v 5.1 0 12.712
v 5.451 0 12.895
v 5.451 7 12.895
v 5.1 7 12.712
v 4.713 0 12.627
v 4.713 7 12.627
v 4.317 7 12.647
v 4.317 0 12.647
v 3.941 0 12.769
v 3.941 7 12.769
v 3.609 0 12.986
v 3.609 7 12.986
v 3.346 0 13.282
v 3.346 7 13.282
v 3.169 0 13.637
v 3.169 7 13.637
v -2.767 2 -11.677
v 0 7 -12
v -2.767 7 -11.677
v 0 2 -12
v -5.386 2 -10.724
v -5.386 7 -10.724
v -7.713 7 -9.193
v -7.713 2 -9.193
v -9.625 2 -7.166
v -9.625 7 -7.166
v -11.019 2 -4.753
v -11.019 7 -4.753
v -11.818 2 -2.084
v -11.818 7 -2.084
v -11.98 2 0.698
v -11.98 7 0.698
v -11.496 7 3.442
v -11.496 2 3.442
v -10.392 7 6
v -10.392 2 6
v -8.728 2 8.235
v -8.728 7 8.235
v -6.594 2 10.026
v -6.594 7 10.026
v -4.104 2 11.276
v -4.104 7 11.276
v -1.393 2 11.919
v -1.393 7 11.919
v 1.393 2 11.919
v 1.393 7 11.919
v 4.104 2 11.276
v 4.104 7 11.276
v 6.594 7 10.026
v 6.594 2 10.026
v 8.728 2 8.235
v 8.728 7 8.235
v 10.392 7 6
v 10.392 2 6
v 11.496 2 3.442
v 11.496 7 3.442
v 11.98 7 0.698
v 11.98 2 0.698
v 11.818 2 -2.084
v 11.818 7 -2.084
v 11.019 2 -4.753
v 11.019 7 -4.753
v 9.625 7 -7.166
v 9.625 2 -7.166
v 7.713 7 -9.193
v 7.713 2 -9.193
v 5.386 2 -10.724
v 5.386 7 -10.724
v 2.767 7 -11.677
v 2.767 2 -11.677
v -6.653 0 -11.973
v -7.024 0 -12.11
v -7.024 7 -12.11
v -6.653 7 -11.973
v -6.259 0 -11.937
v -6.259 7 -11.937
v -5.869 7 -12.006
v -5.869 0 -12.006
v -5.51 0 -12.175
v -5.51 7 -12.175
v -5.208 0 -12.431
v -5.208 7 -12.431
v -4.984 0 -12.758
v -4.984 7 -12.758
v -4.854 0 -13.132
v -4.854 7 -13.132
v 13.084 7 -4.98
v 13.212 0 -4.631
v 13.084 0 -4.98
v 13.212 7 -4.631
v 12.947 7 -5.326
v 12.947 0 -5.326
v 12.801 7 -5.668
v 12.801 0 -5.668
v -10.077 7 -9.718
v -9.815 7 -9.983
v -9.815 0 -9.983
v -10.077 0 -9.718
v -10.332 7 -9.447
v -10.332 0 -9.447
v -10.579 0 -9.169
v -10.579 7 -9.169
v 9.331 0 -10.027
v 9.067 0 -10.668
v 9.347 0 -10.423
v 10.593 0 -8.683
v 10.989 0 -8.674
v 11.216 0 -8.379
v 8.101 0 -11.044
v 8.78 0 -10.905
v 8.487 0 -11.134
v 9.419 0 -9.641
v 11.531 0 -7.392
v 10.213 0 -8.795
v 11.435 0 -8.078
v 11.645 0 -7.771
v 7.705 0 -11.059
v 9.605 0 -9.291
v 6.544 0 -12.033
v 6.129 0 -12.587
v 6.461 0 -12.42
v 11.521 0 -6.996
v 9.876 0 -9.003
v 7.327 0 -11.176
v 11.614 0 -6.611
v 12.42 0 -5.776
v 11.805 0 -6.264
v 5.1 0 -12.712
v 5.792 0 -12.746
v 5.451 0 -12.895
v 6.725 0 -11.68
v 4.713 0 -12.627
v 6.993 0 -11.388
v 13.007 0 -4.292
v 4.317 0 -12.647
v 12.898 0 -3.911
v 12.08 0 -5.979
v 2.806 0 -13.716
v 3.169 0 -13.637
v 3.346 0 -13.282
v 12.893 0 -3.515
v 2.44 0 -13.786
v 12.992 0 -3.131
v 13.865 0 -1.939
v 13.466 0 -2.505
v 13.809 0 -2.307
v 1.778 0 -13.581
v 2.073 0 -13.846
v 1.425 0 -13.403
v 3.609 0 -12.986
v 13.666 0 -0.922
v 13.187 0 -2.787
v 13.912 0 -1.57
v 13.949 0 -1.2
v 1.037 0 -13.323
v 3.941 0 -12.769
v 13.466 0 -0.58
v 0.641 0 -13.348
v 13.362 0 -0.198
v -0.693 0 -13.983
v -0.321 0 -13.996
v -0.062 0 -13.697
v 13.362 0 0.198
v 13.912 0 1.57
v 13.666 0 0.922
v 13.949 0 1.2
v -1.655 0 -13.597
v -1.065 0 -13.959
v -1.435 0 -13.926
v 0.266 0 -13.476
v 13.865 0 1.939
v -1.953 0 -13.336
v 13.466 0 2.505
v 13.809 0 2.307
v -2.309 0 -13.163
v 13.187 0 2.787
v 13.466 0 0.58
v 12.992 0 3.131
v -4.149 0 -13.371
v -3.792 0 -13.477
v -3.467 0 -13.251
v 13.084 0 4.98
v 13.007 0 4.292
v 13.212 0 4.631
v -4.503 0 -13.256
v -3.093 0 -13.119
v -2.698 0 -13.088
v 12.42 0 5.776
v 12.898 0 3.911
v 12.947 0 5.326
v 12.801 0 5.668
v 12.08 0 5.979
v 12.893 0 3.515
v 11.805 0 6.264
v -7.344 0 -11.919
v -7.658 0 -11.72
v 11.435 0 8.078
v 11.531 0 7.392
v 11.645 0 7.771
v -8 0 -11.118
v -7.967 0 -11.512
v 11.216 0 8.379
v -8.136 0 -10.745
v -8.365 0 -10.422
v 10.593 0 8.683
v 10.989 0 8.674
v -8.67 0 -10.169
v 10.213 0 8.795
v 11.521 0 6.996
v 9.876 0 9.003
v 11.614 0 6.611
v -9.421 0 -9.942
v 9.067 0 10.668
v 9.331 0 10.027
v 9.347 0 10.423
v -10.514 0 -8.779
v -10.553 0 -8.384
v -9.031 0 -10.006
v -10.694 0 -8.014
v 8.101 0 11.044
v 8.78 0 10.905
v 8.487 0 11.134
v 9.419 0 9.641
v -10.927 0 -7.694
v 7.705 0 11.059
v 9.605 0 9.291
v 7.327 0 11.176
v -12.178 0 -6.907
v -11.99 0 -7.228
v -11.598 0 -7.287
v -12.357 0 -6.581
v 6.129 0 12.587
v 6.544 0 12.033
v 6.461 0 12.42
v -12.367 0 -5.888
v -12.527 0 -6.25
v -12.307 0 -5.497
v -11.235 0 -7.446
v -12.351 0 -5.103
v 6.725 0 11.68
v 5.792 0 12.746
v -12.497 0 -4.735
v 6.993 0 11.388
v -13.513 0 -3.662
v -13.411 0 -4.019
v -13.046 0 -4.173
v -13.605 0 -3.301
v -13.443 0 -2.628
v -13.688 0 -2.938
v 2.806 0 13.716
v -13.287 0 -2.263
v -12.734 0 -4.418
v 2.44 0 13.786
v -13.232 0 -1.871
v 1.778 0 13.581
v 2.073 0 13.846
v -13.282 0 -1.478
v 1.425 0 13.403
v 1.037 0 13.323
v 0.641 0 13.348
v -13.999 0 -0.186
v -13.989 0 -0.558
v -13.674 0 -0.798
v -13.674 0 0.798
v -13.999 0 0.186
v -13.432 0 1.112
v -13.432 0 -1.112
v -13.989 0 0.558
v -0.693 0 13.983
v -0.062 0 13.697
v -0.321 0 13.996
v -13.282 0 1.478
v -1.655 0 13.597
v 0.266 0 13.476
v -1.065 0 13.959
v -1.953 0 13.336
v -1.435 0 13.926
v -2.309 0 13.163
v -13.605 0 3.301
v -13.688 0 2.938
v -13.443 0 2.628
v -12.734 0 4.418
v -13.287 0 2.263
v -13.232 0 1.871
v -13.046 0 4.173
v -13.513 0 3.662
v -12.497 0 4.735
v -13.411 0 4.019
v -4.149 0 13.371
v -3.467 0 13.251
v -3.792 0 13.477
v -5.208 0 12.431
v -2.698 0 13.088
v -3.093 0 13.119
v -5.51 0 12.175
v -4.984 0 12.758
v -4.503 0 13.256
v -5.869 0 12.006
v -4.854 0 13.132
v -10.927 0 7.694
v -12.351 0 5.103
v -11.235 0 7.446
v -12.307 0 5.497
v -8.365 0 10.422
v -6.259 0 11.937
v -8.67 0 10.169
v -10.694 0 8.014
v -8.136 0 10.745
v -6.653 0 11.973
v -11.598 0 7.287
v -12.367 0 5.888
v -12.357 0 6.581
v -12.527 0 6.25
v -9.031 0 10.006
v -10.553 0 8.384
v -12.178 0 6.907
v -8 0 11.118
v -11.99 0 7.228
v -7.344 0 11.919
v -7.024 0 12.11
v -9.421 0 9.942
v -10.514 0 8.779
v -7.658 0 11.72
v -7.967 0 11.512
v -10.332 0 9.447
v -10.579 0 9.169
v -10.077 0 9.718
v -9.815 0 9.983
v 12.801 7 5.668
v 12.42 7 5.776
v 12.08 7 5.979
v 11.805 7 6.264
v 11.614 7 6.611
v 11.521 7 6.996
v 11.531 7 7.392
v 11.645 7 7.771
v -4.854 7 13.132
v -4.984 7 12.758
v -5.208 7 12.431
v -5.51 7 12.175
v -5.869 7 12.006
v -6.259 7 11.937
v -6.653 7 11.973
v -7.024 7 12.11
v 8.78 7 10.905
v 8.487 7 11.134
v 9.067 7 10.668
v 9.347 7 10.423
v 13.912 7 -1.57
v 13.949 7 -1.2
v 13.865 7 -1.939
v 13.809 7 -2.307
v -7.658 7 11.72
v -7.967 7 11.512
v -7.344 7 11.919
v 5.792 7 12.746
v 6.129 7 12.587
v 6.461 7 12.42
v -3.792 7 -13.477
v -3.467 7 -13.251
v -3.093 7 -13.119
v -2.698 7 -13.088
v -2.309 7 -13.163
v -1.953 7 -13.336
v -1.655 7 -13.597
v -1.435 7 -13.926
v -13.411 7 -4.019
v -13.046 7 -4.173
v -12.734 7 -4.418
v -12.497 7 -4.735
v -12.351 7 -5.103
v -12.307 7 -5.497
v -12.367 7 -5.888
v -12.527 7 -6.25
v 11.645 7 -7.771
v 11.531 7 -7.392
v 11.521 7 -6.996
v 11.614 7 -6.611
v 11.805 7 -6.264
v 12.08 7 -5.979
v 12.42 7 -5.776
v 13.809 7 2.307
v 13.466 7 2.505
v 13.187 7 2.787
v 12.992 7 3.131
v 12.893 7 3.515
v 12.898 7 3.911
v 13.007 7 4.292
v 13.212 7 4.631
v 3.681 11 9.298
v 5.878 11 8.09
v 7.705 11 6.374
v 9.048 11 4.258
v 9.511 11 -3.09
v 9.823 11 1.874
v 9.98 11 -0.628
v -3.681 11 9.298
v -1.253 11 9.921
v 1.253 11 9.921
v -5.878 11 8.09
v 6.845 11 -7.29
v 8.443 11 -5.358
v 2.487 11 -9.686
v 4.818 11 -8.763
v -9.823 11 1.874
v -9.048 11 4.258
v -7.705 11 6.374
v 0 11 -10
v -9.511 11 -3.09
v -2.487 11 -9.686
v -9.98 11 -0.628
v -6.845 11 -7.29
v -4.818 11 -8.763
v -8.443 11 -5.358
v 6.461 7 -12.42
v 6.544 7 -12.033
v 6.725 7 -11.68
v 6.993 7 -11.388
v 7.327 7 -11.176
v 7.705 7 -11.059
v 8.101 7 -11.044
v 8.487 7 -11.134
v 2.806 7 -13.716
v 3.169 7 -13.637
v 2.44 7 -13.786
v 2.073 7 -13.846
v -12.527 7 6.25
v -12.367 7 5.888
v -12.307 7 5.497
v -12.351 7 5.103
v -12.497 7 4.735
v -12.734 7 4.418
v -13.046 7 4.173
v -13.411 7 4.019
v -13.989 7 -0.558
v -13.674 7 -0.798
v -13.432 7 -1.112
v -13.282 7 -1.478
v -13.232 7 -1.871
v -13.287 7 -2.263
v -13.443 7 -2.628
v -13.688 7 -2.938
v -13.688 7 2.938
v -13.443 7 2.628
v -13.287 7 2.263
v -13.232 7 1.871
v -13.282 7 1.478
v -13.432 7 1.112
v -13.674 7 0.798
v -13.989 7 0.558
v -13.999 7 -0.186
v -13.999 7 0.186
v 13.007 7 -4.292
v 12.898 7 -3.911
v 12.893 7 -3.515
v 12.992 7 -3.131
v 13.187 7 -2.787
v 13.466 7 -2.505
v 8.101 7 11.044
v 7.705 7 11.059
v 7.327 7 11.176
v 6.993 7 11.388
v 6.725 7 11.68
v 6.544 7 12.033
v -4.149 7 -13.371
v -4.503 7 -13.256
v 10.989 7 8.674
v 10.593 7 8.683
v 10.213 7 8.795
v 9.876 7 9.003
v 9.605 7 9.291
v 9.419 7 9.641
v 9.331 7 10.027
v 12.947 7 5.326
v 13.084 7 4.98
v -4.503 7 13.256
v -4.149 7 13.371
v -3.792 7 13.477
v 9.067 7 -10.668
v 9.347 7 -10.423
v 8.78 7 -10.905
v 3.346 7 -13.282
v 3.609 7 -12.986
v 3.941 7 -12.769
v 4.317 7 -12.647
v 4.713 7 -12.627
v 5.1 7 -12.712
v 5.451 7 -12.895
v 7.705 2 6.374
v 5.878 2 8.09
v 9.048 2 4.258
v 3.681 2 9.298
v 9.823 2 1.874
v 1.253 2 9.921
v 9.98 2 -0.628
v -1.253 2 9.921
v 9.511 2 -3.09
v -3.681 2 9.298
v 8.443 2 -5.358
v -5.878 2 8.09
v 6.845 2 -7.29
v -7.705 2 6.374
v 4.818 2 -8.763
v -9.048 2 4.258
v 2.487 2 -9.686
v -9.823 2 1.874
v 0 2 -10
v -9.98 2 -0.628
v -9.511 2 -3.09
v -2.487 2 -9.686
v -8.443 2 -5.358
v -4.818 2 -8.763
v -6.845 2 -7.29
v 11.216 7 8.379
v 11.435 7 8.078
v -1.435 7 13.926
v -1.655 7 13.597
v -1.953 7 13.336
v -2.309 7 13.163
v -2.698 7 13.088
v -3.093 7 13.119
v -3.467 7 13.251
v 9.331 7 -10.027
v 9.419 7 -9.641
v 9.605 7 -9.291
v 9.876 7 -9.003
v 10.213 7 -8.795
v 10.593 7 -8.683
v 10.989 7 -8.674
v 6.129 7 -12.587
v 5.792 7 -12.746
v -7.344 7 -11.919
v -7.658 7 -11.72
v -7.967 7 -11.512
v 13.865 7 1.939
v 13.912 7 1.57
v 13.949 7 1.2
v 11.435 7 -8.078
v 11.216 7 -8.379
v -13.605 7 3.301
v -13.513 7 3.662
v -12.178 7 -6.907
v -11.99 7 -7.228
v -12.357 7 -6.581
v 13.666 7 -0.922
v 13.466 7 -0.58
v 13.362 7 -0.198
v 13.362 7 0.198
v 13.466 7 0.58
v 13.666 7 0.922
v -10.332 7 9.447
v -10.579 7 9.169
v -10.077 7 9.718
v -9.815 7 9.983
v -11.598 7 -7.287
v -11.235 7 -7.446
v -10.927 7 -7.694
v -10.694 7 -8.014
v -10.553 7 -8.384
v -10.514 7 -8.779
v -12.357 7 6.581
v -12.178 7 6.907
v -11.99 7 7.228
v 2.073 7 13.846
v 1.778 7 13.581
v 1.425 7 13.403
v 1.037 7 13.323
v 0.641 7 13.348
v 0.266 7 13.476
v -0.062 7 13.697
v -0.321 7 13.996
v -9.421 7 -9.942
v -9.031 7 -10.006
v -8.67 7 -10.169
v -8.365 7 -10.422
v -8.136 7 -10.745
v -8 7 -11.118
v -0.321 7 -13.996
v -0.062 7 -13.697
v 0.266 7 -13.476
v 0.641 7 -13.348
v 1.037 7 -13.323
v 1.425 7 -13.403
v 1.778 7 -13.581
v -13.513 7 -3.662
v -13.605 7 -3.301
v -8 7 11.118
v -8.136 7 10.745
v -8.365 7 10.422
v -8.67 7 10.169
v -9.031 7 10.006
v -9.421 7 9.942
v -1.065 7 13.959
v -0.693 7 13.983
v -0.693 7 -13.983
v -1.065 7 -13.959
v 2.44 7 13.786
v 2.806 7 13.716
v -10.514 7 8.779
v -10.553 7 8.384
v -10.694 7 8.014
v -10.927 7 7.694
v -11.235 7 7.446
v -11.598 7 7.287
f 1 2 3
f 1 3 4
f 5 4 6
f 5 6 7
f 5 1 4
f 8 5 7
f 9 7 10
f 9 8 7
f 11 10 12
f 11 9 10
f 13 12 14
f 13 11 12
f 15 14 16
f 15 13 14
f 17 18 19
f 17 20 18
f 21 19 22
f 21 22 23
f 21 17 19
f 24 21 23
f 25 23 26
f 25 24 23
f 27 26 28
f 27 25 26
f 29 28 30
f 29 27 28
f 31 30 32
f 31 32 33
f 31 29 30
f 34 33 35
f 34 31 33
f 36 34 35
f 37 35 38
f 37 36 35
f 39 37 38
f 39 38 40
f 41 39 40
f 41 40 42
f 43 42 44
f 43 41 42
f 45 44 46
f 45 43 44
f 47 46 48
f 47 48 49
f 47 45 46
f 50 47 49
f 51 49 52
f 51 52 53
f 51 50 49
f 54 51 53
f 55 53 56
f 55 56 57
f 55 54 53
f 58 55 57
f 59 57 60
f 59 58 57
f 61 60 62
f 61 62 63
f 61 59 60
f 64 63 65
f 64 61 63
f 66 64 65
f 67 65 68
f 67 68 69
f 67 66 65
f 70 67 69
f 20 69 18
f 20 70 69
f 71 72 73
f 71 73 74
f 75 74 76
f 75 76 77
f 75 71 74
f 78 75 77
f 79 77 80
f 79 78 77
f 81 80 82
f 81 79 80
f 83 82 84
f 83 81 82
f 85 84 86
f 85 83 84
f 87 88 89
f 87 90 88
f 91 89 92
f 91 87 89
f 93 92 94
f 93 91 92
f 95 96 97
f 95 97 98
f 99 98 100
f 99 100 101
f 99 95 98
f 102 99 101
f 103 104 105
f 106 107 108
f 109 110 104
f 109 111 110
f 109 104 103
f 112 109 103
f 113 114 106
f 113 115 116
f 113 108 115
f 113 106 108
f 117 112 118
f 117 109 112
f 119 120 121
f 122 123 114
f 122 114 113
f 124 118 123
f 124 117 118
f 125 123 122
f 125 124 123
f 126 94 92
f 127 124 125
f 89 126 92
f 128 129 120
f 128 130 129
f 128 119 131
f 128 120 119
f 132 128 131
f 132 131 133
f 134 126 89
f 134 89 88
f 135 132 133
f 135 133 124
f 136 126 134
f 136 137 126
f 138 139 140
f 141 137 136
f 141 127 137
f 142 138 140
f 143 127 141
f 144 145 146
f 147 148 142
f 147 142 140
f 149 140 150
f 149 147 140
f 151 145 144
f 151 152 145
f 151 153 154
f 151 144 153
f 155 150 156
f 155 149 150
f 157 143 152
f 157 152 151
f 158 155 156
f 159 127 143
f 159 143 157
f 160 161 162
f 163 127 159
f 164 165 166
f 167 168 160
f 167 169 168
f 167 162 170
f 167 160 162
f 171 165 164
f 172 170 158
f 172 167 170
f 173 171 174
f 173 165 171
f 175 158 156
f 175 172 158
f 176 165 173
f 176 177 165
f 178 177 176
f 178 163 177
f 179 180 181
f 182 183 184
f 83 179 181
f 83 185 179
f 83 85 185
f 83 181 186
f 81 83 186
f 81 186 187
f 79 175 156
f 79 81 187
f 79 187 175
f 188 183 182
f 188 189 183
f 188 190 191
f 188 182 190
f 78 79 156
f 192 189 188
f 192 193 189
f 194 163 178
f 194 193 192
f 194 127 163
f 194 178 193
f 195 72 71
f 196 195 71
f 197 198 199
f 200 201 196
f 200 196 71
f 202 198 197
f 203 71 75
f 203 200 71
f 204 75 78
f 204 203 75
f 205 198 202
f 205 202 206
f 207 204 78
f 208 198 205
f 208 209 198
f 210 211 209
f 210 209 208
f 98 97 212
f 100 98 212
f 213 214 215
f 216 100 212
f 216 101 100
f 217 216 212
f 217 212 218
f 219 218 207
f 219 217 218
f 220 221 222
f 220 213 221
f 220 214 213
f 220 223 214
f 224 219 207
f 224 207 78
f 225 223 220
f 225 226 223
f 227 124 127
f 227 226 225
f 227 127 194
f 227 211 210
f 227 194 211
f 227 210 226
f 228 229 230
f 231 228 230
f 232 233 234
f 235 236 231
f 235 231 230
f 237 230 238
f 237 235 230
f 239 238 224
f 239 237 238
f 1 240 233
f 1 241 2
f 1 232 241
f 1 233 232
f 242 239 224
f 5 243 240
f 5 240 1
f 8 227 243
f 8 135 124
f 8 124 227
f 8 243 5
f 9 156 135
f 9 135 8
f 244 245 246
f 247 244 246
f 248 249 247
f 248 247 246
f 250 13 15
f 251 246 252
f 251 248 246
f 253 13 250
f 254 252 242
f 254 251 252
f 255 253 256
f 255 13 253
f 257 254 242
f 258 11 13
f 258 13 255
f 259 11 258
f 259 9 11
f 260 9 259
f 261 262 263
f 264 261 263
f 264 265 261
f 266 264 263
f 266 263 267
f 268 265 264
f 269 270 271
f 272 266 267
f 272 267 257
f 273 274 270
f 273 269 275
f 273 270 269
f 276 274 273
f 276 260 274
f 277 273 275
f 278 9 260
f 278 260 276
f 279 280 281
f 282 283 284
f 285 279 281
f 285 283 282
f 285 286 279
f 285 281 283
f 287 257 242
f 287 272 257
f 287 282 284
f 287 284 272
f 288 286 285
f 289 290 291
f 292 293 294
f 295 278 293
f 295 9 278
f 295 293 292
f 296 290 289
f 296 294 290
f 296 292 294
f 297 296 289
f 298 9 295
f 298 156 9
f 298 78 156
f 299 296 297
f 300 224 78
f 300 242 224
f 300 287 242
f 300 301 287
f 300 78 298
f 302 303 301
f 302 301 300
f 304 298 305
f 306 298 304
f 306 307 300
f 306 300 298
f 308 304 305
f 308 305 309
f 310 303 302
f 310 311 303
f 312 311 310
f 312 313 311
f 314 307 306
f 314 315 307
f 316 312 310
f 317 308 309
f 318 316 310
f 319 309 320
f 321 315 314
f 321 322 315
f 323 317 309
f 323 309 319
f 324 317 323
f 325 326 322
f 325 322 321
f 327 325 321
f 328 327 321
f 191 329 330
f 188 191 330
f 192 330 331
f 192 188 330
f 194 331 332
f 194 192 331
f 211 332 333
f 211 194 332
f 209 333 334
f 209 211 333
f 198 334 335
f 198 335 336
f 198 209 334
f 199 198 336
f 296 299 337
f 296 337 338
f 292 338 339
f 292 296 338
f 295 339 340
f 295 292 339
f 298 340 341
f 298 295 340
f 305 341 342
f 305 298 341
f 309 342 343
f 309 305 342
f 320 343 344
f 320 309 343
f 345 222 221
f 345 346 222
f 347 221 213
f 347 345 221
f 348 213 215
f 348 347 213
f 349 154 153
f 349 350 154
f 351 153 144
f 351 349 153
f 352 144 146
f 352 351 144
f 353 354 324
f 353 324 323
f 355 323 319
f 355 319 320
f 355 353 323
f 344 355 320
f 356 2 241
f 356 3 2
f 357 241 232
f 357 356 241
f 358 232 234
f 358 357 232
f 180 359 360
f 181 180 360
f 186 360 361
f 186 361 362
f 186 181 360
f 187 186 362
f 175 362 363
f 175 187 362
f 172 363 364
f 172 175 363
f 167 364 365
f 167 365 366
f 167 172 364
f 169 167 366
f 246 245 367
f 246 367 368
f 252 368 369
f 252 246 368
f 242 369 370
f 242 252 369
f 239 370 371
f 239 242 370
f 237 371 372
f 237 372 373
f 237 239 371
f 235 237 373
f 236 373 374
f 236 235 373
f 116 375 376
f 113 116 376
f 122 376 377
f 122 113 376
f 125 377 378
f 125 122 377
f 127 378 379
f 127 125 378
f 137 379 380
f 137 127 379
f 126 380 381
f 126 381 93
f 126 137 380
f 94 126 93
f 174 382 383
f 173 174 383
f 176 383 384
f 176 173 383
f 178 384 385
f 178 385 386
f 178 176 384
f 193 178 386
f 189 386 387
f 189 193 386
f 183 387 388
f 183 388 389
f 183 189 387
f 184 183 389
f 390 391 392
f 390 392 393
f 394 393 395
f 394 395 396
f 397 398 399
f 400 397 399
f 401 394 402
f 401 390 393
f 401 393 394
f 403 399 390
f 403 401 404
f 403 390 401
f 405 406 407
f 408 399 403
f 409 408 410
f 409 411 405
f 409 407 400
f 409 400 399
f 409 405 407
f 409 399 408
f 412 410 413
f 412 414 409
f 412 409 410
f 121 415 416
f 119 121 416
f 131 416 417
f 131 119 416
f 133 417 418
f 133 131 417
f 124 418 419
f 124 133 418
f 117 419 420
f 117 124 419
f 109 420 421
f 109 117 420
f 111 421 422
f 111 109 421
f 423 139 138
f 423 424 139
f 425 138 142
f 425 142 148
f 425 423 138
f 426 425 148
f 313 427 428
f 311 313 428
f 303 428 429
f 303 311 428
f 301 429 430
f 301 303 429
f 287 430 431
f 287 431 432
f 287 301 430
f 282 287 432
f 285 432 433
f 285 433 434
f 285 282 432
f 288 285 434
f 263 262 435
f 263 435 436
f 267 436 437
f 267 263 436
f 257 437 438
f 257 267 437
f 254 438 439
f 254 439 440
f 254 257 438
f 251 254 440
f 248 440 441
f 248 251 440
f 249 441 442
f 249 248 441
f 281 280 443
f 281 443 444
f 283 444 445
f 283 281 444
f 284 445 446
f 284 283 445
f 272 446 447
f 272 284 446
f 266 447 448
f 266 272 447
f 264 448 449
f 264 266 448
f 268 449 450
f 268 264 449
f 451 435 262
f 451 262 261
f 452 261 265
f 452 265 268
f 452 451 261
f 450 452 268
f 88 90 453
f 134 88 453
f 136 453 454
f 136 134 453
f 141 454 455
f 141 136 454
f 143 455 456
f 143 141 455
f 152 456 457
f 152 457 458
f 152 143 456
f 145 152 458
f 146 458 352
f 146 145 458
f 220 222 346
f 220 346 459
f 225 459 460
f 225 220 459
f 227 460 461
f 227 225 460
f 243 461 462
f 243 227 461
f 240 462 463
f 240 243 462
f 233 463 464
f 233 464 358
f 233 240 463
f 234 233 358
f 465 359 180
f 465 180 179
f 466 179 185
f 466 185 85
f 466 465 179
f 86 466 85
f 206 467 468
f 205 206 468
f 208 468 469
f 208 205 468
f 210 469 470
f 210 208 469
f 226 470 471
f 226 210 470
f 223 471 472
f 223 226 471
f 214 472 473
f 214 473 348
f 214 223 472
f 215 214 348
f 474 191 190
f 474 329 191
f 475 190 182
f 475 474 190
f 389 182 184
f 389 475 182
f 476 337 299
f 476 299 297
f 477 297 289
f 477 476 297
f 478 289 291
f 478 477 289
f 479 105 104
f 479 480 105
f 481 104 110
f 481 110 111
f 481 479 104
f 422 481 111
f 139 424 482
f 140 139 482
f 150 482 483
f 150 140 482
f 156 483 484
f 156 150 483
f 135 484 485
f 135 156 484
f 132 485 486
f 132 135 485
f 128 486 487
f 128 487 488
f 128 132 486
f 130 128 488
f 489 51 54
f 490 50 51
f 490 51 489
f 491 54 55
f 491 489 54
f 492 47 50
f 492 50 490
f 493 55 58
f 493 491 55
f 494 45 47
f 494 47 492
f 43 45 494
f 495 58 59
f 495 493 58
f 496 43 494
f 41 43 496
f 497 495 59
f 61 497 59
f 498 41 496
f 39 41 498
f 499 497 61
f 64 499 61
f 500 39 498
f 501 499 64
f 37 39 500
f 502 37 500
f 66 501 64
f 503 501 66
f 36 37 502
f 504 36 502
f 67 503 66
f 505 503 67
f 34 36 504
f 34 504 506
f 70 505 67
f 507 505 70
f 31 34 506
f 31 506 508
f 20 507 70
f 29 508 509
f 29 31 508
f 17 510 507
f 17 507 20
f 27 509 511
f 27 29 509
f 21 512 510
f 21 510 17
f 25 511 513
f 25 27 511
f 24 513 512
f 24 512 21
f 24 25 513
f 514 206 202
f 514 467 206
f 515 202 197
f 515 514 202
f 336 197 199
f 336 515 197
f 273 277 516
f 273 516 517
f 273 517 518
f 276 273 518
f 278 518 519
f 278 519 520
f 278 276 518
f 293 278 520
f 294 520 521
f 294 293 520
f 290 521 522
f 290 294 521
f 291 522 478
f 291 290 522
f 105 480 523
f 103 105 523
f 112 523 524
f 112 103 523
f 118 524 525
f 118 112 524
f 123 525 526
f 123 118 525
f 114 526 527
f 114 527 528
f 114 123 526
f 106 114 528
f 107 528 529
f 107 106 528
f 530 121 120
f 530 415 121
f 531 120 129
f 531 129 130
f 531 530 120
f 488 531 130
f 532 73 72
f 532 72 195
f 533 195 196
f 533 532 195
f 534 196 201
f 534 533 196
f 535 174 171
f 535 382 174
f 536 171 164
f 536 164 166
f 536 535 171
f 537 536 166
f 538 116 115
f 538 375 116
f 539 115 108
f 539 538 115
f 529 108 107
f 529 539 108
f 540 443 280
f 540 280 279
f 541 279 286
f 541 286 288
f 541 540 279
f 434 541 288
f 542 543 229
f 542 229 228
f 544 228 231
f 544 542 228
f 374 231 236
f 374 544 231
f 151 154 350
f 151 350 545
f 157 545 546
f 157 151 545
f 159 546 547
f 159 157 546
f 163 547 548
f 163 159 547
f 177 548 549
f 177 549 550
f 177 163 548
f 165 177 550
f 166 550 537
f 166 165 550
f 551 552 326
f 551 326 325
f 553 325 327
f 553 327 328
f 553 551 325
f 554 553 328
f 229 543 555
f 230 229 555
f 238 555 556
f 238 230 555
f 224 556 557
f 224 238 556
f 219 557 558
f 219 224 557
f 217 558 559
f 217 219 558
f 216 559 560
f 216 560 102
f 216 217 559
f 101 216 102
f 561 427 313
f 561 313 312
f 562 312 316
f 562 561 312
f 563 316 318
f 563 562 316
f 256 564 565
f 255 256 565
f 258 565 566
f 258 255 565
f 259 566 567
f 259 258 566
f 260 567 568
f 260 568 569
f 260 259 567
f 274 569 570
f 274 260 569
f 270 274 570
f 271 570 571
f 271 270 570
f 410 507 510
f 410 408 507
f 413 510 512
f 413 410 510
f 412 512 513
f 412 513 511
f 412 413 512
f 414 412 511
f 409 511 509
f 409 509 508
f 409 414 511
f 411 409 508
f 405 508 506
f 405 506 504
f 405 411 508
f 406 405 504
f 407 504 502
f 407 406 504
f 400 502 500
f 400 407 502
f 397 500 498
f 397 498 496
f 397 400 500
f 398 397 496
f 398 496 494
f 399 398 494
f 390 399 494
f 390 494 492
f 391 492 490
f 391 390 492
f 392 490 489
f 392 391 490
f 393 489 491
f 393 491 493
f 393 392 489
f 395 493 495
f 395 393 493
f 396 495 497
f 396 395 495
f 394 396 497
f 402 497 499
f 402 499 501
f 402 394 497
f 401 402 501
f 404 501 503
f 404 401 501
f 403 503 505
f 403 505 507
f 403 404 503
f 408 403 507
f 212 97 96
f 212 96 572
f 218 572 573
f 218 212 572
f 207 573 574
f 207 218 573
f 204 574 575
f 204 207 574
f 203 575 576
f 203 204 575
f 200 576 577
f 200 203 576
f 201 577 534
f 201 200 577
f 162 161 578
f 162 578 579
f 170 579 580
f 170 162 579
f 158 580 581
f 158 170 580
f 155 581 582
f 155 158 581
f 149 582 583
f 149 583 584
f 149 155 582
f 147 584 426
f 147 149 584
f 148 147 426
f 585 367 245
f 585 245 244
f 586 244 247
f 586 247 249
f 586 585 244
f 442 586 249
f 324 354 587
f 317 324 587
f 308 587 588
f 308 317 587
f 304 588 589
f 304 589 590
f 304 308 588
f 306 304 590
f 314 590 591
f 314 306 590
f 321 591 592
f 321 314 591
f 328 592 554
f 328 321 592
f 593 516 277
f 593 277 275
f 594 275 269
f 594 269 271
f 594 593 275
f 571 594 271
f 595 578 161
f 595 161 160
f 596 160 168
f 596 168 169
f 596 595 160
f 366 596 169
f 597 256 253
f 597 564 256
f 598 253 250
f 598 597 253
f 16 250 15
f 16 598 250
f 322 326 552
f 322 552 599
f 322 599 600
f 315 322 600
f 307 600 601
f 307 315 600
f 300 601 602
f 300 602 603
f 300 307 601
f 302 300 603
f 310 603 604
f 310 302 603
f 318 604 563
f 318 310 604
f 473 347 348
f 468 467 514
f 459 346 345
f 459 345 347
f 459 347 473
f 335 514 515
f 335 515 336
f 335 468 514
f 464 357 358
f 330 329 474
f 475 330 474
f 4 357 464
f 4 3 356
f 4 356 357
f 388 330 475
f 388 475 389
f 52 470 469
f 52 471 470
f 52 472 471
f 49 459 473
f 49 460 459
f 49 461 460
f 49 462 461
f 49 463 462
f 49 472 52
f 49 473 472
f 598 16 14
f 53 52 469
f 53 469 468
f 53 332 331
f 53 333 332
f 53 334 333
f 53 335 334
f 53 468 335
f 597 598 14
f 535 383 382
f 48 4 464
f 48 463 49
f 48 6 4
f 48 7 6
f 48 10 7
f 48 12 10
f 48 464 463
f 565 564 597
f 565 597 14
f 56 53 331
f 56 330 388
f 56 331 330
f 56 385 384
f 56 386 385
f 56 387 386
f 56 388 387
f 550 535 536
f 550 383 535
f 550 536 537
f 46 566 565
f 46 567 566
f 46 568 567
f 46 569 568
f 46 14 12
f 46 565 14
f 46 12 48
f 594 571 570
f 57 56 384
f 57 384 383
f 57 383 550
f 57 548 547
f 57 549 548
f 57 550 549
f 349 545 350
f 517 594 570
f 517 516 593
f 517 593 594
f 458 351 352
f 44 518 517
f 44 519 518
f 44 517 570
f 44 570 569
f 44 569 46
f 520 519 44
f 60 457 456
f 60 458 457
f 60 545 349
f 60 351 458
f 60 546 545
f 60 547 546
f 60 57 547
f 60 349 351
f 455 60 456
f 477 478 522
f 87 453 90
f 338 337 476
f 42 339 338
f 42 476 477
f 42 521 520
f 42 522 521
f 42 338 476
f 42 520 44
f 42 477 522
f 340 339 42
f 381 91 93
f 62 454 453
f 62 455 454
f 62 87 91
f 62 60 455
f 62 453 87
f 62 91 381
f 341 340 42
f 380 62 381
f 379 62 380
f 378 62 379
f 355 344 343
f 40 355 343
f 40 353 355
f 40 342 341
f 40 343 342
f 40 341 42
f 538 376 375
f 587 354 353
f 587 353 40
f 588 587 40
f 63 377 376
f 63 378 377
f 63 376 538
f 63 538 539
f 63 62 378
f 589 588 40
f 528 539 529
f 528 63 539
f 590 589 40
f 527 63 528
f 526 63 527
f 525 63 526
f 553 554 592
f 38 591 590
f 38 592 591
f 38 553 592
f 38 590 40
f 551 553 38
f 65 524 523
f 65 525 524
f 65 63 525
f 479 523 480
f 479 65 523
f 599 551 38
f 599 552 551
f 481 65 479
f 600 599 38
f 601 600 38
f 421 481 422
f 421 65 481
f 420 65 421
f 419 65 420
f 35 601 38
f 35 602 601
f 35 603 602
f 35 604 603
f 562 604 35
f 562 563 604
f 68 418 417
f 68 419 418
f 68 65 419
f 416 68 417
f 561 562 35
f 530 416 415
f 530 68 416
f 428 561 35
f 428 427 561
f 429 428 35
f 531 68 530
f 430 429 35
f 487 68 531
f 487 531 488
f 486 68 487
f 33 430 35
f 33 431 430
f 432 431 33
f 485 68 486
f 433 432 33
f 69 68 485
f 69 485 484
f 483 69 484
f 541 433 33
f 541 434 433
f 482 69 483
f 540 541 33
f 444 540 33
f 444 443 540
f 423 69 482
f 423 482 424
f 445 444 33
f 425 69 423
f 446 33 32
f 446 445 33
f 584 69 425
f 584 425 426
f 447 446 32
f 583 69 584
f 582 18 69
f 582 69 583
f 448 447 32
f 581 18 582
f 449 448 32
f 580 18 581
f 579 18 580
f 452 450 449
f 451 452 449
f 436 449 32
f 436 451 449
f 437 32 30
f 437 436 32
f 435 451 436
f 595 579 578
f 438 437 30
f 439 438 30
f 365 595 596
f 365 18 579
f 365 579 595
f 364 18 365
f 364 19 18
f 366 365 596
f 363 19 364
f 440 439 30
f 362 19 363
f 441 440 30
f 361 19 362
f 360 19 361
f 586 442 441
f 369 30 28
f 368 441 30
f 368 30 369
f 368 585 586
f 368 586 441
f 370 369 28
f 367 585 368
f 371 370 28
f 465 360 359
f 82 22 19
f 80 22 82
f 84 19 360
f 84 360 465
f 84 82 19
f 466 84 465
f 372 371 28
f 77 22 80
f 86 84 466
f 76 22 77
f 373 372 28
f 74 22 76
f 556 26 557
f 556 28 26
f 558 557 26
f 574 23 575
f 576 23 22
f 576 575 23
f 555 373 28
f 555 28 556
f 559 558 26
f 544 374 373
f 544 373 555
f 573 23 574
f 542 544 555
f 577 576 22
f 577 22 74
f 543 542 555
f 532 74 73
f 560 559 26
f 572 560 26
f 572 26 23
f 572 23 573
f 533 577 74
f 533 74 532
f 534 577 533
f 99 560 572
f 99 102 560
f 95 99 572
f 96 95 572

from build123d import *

# Parameters (mm, degrees)
ENL_V_START             = -7
ESQUISSE2_R             = 1.5
ENL_V_MAT_EXTRU_1_DEPTH = 7


with BuildPart() as part:
    # Esquisse1 → Révolution1 (revolve)
    with BuildSketch(Plane.XY, mode=Mode.PRIVATE) as r_volution1_sk:
        Polygon((0, 0), (-14, 0), (-14, 7), (-12, 7), (-12, 2), (-10, 2), (-10, 11), (0, 11), align=None)
    revolve(r_volution1_sk.sketch.rotate(Axis((0, 0, 0), (0, 1, 0)), 270), axis=Axis((0, 0, 0), (0, 1, 0)))

    # Esquisse2 → Enlèv. mat.-Extru.1 (cut)
    with BuildSketch(Plane(origin=(0, 7, 0), x_dir=(1, 0, 0), z_dir=(0, 1, 0)).offset(ENL_V_START)):
        with Locations((14.848980609, 0)):
            Circle(ESQUISSE2_R)
        with Locations((14.382472578, -3.692791312)):
            Circle(ESQUISSE2_R)
        with Locations((13.012260899, -7.153550965)):
            Circle(ESQUISSE2_R)
        with Locations((10.824441013, -10.164826702)):
            Circle(ESQUISSE2_R)
        with Locations((7.956481688, -12.537408993)):
            Circle(ESQUISSE2_R)
        with Locations((4.588587357, -14.122219768)):
            Circle(ESQUISSE2_R)
        with Locations((0.932375207, -14.819679538)):
            Circle(ESQUISSE2_R)
        with Locations((-2.782421507, -14.585964338)):
            Circle(ESQUISSE2_R)
        with Locations((-6.322388444, -13.435759356)):
            Circle(ESQUISSE2_R)
        with Locations((-9.465096463, -11.441336201)):
            Circle(ESQUISSE2_R)
        with Locations((-12.013077662, -8.728011813)):
            Circle(ESQUISSE2_R)
        with Locations((-13.80623301, -5.466274344)):
            Circle(ESQUISSE2_R)
        with Locations((-14.731891962, -1.861070755)):
            Circle(ESQUISSE2_R)
        with Locations((-14.731891962, 1.861070755)):
            Circle(ESQUISSE2_R)
        with Locations((-13.80623301, 5.466274344)):
            Circle(ESQUISSE2_R)
        with Locations((-12.013077662, 8.728011813)):
            Circle(ESQUISSE2_R)
        with Locations((-9.465096463, 11.441336201)):
            Circle(ESQUISSE2_R)
        with Locations((-6.322388444, 13.435759356)):
            Circle(ESQUISSE2_R)
        with Locations((-2.782421507, 14.585964338)):
            Circle(ESQUISSE2_R)
        with Locations((0.932375207, 14.819679538)):
            Circle(ESQUISSE2_R)
        with Locations((4.588587357, 14.122219768)):
            Circle(ESQUISSE2_R)
        with Locations((7.956481688, 12.537408993)):
            Circle(ESQUISSE2_R)
        with Locations((10.824441013, 10.164826702)):
            Circle(ESQUISSE2_R)
        with Locations((13.012260899, 7.153550965)):
            Circle(ESQUISSE2_R)
        with Locations((14.382472578, 3.692791312)):
            Circle(ESQUISSE2_R)
    extrude(amount=ENL_V_MAT_EXTRU_1_DEPTH, mode=Mode.SUBTRACT)


solid = part.part
